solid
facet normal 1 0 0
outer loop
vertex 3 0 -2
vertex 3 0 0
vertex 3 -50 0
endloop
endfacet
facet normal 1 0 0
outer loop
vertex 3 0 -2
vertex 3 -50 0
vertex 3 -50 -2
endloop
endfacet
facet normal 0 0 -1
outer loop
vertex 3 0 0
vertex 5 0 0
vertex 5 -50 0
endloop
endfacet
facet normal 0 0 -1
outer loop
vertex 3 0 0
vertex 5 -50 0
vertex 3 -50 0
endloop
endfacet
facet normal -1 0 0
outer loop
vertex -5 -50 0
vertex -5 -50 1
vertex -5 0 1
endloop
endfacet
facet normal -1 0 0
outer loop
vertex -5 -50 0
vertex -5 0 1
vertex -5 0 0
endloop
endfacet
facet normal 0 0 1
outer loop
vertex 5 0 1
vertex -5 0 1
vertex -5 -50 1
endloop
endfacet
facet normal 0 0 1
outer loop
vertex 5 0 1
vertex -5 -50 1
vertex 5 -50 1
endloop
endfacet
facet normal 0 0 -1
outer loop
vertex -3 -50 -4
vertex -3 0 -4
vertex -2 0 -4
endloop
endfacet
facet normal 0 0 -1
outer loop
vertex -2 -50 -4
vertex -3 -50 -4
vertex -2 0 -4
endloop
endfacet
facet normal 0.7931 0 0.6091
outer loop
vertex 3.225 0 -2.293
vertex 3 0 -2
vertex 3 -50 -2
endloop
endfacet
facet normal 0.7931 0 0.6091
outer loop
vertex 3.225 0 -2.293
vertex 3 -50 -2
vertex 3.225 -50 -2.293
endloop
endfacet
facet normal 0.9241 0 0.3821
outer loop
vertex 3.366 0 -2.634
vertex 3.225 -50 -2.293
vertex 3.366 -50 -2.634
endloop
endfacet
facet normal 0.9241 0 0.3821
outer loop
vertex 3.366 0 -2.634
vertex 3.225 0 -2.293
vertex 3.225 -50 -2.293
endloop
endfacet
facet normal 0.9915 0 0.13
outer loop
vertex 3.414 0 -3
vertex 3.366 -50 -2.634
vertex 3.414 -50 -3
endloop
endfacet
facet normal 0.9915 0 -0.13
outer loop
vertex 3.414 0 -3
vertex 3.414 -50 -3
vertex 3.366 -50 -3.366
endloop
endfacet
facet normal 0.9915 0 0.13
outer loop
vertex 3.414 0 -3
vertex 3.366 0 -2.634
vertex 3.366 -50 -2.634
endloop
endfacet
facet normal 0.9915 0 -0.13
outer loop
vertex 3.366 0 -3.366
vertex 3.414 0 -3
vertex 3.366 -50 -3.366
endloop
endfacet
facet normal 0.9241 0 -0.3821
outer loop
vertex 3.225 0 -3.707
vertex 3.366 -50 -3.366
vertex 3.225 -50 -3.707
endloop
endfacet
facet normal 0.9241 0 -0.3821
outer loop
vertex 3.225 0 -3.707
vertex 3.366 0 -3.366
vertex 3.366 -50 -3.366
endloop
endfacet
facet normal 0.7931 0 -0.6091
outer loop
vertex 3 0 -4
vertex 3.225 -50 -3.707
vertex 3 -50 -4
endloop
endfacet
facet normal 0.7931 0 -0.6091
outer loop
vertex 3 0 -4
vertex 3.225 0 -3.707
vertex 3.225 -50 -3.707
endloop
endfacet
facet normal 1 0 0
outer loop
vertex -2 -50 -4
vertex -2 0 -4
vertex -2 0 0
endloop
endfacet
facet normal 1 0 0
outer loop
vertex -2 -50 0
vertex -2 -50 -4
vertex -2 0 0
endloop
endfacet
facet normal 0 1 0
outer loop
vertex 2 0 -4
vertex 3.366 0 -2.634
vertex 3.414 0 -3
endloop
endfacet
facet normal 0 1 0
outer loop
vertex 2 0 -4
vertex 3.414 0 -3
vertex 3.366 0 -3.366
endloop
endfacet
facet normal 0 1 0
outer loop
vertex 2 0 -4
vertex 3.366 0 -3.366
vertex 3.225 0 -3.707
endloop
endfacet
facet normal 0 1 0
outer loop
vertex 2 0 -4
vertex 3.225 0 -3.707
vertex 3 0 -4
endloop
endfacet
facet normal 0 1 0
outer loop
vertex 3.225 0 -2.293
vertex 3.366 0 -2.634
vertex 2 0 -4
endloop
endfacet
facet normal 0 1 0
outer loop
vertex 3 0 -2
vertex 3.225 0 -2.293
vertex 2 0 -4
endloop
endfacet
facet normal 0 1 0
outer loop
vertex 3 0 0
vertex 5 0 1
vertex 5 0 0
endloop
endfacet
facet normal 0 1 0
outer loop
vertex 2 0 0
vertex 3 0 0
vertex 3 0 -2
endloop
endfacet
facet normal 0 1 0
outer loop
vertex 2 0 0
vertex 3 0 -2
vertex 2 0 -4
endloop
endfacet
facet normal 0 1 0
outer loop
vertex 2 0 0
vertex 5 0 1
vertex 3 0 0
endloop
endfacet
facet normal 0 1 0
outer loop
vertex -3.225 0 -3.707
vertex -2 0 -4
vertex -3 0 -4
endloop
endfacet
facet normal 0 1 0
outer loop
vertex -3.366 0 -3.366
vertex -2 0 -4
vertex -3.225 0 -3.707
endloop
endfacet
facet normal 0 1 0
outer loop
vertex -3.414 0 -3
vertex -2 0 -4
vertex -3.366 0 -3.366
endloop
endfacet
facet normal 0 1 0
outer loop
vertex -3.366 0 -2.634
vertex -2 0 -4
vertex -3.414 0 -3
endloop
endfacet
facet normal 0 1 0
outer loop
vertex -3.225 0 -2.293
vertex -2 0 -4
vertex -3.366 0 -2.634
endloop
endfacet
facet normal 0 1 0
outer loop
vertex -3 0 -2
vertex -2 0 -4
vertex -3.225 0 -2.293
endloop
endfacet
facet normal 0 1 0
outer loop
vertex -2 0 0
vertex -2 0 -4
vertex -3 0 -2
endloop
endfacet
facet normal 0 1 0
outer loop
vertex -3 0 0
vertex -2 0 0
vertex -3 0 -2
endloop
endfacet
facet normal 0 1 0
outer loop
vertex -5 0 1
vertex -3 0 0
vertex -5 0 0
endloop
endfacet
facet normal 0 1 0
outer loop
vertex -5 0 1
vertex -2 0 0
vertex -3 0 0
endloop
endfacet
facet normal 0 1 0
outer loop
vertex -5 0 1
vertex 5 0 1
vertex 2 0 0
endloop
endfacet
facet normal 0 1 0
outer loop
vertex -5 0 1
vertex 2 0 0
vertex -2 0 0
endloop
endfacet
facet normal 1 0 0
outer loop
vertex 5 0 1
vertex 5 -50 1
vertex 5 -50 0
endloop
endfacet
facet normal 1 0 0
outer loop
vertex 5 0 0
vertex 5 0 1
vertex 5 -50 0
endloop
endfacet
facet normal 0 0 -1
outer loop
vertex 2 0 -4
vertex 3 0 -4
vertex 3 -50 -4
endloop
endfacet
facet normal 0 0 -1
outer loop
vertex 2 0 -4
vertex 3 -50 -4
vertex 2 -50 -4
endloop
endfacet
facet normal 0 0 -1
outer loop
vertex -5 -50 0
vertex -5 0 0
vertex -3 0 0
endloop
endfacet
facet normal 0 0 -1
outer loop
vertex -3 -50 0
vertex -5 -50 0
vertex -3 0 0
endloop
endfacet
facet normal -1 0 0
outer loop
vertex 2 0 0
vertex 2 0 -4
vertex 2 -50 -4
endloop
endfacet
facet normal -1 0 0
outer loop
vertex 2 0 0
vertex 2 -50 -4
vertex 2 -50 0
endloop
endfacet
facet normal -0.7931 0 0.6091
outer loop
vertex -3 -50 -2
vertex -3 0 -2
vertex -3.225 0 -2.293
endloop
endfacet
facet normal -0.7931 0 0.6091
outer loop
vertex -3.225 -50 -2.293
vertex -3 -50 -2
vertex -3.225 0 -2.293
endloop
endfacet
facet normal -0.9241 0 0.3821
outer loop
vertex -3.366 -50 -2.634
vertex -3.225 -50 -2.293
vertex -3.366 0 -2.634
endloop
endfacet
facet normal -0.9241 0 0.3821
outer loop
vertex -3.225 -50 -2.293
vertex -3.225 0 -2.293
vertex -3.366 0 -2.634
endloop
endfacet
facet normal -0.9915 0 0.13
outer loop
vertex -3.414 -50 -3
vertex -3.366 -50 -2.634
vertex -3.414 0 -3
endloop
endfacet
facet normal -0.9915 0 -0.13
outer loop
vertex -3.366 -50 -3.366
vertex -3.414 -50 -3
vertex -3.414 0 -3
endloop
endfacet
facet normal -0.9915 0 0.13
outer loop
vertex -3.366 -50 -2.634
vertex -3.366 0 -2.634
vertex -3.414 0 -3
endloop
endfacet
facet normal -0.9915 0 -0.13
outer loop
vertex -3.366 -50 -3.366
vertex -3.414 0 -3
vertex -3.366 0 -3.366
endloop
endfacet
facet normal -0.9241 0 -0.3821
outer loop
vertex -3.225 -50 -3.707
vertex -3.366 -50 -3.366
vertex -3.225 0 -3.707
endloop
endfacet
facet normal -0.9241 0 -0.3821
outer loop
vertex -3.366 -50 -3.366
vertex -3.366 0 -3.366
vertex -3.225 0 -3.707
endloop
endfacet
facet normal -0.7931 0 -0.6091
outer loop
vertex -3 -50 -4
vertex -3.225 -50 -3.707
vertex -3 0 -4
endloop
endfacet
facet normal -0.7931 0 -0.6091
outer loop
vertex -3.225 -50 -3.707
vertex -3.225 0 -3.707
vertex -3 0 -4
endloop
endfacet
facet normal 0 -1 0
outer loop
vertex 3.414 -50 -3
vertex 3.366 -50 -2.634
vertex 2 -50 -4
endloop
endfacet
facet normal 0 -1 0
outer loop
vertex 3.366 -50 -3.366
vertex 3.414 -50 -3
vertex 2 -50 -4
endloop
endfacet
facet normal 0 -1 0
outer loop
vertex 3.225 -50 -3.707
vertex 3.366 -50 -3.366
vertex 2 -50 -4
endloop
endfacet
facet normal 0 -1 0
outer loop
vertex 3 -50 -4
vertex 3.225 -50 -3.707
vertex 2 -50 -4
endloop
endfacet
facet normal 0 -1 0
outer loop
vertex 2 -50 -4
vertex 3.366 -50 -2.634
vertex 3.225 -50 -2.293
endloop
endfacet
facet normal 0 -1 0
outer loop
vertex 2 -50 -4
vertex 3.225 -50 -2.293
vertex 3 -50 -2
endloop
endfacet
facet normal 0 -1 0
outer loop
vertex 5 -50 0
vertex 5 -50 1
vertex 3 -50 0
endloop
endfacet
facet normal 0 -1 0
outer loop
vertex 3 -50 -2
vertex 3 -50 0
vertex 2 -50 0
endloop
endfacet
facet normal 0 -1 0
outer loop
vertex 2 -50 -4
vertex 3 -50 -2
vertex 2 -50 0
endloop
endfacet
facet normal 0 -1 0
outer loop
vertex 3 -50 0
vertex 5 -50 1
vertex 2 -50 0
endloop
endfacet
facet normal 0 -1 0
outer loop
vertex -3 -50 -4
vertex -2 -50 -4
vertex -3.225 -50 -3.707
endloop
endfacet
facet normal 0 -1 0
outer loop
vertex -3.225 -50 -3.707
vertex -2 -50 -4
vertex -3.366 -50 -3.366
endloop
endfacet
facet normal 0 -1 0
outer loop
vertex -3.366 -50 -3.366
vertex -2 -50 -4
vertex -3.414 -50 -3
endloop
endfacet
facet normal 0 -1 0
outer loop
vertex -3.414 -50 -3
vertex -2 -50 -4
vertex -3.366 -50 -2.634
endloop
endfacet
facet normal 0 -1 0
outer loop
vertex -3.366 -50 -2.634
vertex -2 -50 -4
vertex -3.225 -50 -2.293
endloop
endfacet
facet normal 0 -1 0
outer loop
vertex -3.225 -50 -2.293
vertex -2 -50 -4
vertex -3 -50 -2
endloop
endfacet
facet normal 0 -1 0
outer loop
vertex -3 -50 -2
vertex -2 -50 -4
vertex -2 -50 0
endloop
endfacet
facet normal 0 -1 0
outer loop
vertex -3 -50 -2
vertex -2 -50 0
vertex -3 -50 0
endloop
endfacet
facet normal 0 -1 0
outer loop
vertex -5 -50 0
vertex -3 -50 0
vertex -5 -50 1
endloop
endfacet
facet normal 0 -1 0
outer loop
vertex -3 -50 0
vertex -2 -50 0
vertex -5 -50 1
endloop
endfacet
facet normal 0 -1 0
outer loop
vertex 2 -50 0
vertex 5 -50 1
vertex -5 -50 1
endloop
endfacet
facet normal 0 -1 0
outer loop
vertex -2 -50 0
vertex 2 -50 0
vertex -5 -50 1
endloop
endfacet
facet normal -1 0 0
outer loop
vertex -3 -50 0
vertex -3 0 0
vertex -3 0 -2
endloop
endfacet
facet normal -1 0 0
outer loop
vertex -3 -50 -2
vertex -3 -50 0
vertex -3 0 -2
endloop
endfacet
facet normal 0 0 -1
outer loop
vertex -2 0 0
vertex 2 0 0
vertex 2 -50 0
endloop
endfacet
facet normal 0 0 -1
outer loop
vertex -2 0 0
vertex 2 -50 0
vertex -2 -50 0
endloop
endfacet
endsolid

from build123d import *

# Parameters (mm, degrees)
F1_DEPTH = 50


with BuildPart() as f1:
    # F0 (on Front) → F1 (new body)
    with BuildSketch(Plane.XZ):
        with BuildLine():
            Line((0, 0), (0, 1))
            Line((0, 1), (-5, 1))
            Line((-5, 1), (-5, 0))
            Line((-5, 0), (-3, 0))
            Line((-3, 0), (-3, -2))
            ThreePointArc((-3, -2), (-3.414214, -3), (-3, -4))
            Line((-3, -4), (-2, -4))
            Line((-2, -4), (-2, 0))
            Line((-2, 0), (0, 0))
        make_face()
    extrude(amount=F1_DEPTH)

    # F2: F1 across plane


with BuildPart() as f1_1:
    add(f1.part)
    add(f1.part.mirror(Plane.YZ))


solid = f1_1.part
